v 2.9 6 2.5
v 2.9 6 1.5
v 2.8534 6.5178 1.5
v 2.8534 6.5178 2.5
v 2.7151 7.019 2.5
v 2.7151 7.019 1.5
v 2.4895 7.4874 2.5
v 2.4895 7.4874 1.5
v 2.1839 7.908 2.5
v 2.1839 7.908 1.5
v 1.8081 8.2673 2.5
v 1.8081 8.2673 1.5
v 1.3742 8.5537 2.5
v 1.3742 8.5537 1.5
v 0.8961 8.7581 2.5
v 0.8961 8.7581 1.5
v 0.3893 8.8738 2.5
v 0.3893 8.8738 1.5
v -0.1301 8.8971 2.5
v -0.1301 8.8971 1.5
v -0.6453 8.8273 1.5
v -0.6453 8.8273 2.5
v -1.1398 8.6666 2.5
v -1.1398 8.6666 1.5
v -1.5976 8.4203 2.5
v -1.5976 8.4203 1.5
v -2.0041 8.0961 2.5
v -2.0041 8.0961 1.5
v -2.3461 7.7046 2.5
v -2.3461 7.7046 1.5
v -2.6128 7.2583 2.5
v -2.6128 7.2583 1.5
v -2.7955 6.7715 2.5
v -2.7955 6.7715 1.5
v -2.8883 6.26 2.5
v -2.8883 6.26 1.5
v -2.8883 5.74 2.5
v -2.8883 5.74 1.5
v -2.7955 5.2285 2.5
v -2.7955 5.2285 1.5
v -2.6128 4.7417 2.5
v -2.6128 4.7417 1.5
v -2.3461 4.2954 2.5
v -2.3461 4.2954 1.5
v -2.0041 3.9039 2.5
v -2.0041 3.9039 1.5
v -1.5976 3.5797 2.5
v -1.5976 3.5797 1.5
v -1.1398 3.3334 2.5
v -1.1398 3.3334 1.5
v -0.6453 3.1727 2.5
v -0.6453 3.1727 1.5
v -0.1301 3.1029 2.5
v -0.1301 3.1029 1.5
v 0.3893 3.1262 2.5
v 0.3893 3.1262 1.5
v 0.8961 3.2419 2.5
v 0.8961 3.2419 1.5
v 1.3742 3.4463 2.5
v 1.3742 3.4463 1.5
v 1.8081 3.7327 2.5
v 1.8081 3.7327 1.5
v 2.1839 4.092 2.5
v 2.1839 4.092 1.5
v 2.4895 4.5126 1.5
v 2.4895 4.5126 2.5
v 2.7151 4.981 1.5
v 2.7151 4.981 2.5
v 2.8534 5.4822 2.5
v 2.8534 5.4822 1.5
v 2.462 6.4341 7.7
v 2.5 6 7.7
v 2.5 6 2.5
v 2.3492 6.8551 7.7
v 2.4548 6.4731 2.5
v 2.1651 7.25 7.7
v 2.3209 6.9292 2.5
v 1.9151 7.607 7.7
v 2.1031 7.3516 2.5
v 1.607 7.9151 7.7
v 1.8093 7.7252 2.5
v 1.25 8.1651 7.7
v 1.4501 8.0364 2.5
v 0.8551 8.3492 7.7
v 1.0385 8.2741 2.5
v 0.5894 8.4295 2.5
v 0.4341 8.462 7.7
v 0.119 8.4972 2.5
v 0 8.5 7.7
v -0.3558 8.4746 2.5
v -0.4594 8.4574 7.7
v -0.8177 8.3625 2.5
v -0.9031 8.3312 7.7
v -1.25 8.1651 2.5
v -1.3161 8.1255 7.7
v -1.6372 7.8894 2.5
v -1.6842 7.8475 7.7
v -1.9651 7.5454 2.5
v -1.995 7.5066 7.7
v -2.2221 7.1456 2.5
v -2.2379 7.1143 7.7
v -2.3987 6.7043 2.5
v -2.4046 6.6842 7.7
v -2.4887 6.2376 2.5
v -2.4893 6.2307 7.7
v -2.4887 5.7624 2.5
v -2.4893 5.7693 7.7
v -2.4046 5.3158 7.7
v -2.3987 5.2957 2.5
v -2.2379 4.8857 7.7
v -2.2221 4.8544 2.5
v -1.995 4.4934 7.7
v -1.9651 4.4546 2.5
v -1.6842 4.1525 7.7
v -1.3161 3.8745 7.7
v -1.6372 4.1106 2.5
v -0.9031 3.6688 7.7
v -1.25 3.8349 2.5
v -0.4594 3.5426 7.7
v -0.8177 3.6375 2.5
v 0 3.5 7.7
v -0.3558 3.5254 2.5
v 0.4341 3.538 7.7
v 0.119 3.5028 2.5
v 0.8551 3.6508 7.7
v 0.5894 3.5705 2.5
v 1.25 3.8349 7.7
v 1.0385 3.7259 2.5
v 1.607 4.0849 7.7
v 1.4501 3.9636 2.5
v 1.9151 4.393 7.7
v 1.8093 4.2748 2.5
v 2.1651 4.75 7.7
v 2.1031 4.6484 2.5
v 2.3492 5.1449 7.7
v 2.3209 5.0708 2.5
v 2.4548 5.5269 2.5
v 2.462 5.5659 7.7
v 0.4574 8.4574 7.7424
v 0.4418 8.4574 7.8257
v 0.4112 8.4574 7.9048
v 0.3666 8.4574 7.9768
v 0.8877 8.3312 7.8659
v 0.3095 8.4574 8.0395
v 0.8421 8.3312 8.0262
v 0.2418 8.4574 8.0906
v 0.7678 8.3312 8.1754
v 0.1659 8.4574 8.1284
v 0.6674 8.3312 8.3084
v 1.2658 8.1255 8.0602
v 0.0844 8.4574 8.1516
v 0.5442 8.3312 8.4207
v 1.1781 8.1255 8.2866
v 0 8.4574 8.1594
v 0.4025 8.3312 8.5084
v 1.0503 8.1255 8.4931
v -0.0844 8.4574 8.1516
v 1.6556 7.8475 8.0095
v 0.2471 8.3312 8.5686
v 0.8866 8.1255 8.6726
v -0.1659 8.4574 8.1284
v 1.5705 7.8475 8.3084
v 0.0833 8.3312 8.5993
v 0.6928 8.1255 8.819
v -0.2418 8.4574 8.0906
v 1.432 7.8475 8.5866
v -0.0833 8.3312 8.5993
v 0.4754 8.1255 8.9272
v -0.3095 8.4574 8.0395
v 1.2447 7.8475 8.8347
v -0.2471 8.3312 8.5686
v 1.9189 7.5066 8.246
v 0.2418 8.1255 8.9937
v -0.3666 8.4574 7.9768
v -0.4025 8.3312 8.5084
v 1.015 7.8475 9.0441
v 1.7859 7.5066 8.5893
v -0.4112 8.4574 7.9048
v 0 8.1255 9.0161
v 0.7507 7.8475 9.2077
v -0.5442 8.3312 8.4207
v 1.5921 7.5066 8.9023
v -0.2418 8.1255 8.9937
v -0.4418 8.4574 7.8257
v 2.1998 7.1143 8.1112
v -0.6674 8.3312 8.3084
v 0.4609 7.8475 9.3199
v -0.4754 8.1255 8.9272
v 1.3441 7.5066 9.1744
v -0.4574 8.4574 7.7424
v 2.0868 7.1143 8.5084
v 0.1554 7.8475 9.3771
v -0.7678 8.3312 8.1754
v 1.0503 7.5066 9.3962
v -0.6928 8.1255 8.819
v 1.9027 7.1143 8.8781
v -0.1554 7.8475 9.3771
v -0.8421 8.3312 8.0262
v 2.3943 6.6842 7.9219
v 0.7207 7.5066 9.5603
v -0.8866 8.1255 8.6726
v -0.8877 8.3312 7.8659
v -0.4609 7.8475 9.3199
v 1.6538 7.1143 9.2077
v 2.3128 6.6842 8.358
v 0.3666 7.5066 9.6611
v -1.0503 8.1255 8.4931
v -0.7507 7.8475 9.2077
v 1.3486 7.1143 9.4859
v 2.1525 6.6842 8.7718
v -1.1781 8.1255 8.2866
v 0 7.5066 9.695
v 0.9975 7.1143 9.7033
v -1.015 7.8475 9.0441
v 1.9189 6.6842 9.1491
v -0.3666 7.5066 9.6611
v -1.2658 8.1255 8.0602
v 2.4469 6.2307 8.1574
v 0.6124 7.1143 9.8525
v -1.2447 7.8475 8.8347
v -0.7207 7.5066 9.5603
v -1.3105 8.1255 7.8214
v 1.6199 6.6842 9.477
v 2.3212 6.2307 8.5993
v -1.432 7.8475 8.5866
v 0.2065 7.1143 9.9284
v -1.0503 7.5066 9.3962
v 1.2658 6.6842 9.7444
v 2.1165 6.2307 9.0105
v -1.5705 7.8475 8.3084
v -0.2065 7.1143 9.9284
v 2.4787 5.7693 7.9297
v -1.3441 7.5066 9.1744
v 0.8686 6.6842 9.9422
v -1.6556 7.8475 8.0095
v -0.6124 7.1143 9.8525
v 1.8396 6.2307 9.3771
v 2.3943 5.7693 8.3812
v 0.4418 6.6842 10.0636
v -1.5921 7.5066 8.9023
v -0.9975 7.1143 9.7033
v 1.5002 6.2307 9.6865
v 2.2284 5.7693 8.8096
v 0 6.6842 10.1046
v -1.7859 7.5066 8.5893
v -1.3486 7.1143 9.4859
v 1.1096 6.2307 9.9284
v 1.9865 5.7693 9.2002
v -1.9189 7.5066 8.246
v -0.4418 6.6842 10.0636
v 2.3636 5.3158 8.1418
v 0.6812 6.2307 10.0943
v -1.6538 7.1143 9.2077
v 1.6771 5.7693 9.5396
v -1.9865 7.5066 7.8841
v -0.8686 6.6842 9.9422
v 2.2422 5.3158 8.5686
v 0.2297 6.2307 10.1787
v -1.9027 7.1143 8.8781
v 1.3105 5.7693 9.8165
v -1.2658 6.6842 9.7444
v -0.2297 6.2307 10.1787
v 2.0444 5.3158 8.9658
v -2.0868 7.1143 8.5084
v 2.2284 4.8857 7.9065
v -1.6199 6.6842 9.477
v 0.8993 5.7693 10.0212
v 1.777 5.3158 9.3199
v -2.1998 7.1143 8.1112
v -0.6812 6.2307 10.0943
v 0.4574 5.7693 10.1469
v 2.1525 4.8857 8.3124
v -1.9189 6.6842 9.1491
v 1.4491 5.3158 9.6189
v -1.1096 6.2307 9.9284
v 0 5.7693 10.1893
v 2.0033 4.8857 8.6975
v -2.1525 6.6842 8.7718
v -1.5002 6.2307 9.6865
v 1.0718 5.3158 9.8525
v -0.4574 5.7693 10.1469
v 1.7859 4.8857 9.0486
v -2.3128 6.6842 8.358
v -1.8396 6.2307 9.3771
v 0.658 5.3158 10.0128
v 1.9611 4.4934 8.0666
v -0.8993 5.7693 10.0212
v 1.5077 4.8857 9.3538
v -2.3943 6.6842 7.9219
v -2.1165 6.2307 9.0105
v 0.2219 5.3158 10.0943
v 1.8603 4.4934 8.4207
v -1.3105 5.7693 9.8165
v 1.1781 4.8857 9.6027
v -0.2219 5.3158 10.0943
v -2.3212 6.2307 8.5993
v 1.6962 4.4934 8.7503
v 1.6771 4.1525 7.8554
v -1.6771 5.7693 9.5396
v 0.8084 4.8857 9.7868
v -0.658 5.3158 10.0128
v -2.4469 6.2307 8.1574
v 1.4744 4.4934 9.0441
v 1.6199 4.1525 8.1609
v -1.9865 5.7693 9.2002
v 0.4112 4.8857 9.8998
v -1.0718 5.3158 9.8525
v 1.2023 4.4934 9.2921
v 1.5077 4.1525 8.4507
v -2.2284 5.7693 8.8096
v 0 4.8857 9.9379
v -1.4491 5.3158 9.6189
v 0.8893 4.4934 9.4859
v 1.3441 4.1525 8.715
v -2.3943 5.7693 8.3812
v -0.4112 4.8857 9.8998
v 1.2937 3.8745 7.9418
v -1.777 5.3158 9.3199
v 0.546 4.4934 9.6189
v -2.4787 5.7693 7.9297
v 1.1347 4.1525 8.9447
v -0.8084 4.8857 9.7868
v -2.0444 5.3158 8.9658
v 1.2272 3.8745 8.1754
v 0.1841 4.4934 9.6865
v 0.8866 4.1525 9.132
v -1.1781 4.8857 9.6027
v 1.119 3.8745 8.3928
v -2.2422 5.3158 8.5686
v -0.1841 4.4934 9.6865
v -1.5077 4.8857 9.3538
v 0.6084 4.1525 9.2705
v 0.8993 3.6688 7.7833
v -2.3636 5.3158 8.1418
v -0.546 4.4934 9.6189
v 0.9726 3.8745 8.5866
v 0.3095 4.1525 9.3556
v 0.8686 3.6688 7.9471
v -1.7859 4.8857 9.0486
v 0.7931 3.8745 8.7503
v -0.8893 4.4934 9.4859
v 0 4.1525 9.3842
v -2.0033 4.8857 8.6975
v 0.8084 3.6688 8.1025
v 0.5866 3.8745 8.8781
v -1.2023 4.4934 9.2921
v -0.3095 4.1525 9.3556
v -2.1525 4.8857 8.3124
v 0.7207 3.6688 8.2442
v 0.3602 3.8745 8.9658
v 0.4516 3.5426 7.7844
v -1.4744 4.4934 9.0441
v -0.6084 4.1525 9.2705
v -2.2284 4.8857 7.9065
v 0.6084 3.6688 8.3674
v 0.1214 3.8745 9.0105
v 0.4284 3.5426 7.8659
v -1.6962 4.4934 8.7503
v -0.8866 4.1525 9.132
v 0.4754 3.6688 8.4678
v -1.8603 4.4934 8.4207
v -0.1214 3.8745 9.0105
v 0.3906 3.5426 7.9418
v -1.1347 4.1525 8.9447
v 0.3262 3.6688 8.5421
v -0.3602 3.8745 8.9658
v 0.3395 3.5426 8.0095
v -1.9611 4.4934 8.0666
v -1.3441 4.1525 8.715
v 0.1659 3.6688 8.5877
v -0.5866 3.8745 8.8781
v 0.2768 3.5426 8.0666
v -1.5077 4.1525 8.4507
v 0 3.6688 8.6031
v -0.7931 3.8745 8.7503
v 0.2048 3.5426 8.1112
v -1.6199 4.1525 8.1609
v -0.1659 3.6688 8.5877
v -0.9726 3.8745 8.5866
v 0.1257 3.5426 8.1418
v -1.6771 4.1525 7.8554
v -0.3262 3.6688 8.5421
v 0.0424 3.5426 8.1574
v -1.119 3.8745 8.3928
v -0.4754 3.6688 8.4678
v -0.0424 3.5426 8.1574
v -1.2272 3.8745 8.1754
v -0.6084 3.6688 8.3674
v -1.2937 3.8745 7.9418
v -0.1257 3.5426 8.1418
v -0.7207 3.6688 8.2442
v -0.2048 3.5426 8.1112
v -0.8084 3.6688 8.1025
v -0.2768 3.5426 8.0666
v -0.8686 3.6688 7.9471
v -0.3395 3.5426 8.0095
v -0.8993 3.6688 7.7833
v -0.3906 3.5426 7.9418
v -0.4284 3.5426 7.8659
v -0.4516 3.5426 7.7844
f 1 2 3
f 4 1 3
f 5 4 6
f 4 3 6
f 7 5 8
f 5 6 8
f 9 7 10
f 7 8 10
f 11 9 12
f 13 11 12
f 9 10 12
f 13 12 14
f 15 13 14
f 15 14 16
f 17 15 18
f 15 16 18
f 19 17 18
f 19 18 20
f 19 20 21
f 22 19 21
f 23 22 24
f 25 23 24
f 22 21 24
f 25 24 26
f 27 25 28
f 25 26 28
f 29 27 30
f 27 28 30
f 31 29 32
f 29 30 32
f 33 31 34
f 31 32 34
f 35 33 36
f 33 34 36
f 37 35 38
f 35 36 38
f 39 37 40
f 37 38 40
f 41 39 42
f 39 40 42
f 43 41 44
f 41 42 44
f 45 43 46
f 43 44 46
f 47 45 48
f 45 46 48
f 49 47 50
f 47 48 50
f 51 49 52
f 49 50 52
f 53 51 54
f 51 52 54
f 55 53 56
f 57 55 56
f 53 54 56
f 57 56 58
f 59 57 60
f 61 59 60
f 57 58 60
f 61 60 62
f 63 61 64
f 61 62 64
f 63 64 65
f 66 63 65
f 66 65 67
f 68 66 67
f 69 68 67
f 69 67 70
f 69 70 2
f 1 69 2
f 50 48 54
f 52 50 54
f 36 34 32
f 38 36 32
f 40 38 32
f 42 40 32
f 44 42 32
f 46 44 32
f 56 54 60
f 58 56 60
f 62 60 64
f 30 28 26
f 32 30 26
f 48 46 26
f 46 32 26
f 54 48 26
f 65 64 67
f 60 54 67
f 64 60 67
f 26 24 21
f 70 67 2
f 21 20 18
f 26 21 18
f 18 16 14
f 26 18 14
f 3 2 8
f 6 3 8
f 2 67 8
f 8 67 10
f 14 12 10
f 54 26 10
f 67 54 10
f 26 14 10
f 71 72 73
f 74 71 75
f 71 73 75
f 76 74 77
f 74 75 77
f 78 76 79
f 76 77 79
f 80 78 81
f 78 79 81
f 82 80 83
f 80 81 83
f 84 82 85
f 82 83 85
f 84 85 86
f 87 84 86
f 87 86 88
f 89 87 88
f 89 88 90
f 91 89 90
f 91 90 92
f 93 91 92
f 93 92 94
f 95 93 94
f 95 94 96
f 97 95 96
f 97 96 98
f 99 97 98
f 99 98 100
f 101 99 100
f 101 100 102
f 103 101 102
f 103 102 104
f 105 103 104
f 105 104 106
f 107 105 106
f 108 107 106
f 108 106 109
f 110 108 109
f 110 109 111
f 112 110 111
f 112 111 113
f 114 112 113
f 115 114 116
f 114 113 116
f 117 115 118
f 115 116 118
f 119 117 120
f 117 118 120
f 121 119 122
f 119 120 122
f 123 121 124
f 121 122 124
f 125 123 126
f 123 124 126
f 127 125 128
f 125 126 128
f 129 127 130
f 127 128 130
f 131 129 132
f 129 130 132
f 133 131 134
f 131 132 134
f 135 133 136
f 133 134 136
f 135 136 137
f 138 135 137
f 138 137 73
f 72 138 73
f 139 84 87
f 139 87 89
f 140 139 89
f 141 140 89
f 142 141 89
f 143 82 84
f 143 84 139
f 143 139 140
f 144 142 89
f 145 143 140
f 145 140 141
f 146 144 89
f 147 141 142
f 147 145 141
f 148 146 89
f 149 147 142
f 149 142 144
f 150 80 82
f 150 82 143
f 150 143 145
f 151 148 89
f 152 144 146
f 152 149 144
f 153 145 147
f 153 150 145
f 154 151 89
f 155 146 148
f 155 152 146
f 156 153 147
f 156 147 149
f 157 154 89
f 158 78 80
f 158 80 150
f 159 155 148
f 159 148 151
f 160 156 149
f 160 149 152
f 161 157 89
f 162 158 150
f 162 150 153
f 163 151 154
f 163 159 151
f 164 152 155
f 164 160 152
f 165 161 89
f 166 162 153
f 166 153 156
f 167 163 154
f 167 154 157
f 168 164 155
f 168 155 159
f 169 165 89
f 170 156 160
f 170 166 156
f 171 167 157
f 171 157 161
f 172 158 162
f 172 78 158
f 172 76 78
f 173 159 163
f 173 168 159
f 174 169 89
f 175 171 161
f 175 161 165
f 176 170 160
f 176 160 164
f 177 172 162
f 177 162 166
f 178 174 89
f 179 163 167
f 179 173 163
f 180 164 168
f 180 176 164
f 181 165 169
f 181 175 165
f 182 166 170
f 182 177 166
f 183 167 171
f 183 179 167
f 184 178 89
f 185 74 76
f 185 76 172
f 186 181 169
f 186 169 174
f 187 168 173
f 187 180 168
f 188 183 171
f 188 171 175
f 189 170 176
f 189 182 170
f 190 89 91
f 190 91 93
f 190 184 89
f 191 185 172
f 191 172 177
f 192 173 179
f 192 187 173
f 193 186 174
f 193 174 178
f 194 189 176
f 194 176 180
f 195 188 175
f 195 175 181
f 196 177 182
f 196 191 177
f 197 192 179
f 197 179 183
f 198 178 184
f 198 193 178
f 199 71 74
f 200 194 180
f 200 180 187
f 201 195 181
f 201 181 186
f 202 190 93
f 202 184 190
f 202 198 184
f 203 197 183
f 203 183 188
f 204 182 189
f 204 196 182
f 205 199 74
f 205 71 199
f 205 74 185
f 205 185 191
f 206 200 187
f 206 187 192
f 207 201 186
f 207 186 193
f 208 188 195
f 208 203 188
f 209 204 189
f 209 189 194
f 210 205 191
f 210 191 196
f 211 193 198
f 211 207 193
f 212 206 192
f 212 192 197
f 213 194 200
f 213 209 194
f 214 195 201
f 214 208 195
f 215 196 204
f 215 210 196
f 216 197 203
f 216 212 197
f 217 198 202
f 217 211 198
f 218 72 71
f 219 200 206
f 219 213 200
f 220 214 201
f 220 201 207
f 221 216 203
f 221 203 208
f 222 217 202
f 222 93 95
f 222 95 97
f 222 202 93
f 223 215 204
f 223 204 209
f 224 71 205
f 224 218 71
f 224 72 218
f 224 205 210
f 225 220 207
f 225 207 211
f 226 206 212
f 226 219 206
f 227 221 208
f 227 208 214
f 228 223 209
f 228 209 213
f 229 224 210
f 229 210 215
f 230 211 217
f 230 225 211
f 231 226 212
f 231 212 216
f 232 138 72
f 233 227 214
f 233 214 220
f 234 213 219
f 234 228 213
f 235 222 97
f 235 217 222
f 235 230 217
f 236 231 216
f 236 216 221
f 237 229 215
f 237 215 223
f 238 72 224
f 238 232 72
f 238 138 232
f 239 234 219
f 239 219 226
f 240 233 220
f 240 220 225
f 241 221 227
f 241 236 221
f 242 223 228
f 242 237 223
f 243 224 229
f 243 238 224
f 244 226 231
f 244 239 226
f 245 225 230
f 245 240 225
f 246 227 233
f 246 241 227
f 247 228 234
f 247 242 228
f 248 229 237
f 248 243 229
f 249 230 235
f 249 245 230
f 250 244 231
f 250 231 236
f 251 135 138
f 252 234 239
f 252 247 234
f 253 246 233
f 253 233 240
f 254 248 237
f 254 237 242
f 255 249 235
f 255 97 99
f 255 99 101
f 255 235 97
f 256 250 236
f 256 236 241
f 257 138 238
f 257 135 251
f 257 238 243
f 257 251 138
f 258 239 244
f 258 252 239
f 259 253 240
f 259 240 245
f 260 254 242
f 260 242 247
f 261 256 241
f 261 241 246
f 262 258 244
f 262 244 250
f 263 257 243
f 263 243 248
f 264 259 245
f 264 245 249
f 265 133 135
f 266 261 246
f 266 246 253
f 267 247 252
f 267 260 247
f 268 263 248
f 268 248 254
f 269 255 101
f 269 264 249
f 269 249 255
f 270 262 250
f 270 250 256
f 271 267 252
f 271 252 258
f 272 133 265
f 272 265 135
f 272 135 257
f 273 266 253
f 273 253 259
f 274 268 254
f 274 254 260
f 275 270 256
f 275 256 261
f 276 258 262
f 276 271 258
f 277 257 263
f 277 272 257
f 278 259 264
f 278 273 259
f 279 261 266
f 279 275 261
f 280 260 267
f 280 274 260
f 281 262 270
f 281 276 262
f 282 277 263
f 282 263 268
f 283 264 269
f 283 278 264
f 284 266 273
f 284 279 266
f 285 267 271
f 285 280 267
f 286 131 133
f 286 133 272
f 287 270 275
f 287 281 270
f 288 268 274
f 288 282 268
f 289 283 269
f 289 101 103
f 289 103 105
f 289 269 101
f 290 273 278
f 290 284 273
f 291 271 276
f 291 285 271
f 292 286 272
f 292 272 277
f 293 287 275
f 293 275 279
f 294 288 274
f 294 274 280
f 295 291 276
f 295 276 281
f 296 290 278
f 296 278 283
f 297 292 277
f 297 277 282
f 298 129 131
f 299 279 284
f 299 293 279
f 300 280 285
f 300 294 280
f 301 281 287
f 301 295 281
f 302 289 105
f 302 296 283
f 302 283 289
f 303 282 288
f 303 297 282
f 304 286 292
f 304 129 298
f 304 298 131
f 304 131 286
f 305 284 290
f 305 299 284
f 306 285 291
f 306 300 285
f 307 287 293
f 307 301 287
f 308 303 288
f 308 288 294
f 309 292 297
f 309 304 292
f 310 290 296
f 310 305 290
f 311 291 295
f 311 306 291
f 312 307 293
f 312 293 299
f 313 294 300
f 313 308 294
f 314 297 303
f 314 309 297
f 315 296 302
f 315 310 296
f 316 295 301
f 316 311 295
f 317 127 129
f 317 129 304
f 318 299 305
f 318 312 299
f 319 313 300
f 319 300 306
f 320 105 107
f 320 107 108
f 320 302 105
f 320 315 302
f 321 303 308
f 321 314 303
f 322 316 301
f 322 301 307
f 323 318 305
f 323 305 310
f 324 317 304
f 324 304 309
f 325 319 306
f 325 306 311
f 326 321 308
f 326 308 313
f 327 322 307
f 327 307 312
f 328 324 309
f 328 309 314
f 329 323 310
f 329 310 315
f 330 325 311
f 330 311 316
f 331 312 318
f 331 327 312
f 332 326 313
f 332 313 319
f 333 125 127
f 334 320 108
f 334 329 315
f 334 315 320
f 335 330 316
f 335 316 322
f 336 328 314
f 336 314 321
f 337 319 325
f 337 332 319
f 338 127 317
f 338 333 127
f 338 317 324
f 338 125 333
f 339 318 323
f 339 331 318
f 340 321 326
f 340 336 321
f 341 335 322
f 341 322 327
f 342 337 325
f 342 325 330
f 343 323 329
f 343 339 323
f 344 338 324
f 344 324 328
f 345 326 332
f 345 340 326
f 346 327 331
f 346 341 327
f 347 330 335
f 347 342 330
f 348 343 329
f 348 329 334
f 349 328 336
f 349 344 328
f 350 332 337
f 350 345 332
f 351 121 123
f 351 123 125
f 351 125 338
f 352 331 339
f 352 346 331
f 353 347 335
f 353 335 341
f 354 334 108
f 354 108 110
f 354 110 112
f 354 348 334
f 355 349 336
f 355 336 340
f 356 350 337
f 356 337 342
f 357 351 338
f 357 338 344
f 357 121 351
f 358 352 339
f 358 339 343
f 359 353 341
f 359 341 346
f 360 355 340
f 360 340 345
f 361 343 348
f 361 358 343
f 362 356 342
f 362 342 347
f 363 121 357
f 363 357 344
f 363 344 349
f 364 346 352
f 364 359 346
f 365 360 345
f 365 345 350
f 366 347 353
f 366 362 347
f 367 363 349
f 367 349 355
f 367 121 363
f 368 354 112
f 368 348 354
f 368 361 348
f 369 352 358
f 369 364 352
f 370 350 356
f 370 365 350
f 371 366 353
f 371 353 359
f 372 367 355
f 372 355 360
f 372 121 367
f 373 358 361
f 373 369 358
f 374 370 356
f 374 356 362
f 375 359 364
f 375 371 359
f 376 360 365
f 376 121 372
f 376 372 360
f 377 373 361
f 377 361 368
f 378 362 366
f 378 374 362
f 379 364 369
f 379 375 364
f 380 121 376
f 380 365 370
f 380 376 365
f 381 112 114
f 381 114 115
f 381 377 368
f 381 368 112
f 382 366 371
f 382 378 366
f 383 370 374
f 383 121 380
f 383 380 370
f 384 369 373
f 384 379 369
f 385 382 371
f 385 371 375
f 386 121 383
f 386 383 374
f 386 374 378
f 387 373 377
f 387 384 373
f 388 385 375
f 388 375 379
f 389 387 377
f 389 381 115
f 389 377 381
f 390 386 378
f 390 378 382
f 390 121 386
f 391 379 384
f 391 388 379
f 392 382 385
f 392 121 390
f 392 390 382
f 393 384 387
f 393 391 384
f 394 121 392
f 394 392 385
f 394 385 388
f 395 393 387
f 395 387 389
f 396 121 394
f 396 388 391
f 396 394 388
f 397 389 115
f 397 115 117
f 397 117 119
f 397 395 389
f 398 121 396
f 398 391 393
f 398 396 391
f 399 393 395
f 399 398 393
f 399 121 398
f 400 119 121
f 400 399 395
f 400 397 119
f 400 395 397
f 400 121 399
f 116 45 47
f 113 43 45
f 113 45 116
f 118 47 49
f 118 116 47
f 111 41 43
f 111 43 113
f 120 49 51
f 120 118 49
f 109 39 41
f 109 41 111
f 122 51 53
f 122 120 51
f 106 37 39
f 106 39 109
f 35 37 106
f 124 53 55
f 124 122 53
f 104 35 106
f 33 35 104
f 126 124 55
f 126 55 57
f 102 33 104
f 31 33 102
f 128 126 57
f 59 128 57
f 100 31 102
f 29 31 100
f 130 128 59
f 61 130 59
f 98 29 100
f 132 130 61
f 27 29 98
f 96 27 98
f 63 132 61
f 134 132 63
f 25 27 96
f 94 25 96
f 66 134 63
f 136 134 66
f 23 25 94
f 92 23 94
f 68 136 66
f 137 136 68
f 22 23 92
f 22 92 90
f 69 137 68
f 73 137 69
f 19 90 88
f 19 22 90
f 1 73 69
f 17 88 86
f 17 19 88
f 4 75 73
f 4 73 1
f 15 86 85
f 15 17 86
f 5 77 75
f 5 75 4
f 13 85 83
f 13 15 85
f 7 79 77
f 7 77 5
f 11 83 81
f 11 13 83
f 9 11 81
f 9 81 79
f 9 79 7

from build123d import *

# Parameters (mm, degrees)
CYLINDER003_R     = 2.9
CYLINDER003_DEPTH = 1
SPHERE_ANGLE      = 180
SPHERE_ROLL_ANGLE = 90
CYLINDER002_R     = 2.5
CYLINDER002_DEPTH = 6.2


with BuildPart() as cilindro003:
    # Cylinder003 → Cylinder003 (new body)
    with BuildSketch(Plane.XY):
        Circle(CYLINDER003_R)
    extrude(amount=CYLINDER003_DEPTH)


with BuildPart() as esf_ra:
    # Sphere → Sphere (revolve)
    with BuildSketch(Plane.XZ):
        with BuildLine():
            ThreePointArc((0, -2.5), (2.5, 0), (0, 2.5))
            Line((0, 2.5), (0, -2.5))
        make_face()
    revolve(axis=Axis((0, 0, 0), (0, 0, 1)), revolution_arc=SPHERE_ANGLE)


with BuildPart() as esf_ra_1:
    # Sphere roll: moved
    add(esf_ra.part.rotate(Axis((0, 0, 0), (1, 0, 0)), SPHERE_ROLL_ANGLE))


with BuildPart() as esf_ra_2:
    # Sphere placement: moved
    add(esf_ra_1.part.moved(Location((0, 0, 6.2))))


with BuildPart() as funda:
    # Cylinder002 → Cylinder002 (new body)
    with BuildSketch(Plane.XY):
        Circle(CYLINDER002_R)
    extrude(amount=CYLINDER002_DEPTH)

    # Fusion001: union Cilindro003, Esféra
    add(cilindro003.part)
    add(esf_ra_2.part)


with BuildPart() as funda_1:
    # Fusion001 placement: moved
    add(funda.part.moved(Location((0, 6, 1.5))))


solid = funda_1.part
